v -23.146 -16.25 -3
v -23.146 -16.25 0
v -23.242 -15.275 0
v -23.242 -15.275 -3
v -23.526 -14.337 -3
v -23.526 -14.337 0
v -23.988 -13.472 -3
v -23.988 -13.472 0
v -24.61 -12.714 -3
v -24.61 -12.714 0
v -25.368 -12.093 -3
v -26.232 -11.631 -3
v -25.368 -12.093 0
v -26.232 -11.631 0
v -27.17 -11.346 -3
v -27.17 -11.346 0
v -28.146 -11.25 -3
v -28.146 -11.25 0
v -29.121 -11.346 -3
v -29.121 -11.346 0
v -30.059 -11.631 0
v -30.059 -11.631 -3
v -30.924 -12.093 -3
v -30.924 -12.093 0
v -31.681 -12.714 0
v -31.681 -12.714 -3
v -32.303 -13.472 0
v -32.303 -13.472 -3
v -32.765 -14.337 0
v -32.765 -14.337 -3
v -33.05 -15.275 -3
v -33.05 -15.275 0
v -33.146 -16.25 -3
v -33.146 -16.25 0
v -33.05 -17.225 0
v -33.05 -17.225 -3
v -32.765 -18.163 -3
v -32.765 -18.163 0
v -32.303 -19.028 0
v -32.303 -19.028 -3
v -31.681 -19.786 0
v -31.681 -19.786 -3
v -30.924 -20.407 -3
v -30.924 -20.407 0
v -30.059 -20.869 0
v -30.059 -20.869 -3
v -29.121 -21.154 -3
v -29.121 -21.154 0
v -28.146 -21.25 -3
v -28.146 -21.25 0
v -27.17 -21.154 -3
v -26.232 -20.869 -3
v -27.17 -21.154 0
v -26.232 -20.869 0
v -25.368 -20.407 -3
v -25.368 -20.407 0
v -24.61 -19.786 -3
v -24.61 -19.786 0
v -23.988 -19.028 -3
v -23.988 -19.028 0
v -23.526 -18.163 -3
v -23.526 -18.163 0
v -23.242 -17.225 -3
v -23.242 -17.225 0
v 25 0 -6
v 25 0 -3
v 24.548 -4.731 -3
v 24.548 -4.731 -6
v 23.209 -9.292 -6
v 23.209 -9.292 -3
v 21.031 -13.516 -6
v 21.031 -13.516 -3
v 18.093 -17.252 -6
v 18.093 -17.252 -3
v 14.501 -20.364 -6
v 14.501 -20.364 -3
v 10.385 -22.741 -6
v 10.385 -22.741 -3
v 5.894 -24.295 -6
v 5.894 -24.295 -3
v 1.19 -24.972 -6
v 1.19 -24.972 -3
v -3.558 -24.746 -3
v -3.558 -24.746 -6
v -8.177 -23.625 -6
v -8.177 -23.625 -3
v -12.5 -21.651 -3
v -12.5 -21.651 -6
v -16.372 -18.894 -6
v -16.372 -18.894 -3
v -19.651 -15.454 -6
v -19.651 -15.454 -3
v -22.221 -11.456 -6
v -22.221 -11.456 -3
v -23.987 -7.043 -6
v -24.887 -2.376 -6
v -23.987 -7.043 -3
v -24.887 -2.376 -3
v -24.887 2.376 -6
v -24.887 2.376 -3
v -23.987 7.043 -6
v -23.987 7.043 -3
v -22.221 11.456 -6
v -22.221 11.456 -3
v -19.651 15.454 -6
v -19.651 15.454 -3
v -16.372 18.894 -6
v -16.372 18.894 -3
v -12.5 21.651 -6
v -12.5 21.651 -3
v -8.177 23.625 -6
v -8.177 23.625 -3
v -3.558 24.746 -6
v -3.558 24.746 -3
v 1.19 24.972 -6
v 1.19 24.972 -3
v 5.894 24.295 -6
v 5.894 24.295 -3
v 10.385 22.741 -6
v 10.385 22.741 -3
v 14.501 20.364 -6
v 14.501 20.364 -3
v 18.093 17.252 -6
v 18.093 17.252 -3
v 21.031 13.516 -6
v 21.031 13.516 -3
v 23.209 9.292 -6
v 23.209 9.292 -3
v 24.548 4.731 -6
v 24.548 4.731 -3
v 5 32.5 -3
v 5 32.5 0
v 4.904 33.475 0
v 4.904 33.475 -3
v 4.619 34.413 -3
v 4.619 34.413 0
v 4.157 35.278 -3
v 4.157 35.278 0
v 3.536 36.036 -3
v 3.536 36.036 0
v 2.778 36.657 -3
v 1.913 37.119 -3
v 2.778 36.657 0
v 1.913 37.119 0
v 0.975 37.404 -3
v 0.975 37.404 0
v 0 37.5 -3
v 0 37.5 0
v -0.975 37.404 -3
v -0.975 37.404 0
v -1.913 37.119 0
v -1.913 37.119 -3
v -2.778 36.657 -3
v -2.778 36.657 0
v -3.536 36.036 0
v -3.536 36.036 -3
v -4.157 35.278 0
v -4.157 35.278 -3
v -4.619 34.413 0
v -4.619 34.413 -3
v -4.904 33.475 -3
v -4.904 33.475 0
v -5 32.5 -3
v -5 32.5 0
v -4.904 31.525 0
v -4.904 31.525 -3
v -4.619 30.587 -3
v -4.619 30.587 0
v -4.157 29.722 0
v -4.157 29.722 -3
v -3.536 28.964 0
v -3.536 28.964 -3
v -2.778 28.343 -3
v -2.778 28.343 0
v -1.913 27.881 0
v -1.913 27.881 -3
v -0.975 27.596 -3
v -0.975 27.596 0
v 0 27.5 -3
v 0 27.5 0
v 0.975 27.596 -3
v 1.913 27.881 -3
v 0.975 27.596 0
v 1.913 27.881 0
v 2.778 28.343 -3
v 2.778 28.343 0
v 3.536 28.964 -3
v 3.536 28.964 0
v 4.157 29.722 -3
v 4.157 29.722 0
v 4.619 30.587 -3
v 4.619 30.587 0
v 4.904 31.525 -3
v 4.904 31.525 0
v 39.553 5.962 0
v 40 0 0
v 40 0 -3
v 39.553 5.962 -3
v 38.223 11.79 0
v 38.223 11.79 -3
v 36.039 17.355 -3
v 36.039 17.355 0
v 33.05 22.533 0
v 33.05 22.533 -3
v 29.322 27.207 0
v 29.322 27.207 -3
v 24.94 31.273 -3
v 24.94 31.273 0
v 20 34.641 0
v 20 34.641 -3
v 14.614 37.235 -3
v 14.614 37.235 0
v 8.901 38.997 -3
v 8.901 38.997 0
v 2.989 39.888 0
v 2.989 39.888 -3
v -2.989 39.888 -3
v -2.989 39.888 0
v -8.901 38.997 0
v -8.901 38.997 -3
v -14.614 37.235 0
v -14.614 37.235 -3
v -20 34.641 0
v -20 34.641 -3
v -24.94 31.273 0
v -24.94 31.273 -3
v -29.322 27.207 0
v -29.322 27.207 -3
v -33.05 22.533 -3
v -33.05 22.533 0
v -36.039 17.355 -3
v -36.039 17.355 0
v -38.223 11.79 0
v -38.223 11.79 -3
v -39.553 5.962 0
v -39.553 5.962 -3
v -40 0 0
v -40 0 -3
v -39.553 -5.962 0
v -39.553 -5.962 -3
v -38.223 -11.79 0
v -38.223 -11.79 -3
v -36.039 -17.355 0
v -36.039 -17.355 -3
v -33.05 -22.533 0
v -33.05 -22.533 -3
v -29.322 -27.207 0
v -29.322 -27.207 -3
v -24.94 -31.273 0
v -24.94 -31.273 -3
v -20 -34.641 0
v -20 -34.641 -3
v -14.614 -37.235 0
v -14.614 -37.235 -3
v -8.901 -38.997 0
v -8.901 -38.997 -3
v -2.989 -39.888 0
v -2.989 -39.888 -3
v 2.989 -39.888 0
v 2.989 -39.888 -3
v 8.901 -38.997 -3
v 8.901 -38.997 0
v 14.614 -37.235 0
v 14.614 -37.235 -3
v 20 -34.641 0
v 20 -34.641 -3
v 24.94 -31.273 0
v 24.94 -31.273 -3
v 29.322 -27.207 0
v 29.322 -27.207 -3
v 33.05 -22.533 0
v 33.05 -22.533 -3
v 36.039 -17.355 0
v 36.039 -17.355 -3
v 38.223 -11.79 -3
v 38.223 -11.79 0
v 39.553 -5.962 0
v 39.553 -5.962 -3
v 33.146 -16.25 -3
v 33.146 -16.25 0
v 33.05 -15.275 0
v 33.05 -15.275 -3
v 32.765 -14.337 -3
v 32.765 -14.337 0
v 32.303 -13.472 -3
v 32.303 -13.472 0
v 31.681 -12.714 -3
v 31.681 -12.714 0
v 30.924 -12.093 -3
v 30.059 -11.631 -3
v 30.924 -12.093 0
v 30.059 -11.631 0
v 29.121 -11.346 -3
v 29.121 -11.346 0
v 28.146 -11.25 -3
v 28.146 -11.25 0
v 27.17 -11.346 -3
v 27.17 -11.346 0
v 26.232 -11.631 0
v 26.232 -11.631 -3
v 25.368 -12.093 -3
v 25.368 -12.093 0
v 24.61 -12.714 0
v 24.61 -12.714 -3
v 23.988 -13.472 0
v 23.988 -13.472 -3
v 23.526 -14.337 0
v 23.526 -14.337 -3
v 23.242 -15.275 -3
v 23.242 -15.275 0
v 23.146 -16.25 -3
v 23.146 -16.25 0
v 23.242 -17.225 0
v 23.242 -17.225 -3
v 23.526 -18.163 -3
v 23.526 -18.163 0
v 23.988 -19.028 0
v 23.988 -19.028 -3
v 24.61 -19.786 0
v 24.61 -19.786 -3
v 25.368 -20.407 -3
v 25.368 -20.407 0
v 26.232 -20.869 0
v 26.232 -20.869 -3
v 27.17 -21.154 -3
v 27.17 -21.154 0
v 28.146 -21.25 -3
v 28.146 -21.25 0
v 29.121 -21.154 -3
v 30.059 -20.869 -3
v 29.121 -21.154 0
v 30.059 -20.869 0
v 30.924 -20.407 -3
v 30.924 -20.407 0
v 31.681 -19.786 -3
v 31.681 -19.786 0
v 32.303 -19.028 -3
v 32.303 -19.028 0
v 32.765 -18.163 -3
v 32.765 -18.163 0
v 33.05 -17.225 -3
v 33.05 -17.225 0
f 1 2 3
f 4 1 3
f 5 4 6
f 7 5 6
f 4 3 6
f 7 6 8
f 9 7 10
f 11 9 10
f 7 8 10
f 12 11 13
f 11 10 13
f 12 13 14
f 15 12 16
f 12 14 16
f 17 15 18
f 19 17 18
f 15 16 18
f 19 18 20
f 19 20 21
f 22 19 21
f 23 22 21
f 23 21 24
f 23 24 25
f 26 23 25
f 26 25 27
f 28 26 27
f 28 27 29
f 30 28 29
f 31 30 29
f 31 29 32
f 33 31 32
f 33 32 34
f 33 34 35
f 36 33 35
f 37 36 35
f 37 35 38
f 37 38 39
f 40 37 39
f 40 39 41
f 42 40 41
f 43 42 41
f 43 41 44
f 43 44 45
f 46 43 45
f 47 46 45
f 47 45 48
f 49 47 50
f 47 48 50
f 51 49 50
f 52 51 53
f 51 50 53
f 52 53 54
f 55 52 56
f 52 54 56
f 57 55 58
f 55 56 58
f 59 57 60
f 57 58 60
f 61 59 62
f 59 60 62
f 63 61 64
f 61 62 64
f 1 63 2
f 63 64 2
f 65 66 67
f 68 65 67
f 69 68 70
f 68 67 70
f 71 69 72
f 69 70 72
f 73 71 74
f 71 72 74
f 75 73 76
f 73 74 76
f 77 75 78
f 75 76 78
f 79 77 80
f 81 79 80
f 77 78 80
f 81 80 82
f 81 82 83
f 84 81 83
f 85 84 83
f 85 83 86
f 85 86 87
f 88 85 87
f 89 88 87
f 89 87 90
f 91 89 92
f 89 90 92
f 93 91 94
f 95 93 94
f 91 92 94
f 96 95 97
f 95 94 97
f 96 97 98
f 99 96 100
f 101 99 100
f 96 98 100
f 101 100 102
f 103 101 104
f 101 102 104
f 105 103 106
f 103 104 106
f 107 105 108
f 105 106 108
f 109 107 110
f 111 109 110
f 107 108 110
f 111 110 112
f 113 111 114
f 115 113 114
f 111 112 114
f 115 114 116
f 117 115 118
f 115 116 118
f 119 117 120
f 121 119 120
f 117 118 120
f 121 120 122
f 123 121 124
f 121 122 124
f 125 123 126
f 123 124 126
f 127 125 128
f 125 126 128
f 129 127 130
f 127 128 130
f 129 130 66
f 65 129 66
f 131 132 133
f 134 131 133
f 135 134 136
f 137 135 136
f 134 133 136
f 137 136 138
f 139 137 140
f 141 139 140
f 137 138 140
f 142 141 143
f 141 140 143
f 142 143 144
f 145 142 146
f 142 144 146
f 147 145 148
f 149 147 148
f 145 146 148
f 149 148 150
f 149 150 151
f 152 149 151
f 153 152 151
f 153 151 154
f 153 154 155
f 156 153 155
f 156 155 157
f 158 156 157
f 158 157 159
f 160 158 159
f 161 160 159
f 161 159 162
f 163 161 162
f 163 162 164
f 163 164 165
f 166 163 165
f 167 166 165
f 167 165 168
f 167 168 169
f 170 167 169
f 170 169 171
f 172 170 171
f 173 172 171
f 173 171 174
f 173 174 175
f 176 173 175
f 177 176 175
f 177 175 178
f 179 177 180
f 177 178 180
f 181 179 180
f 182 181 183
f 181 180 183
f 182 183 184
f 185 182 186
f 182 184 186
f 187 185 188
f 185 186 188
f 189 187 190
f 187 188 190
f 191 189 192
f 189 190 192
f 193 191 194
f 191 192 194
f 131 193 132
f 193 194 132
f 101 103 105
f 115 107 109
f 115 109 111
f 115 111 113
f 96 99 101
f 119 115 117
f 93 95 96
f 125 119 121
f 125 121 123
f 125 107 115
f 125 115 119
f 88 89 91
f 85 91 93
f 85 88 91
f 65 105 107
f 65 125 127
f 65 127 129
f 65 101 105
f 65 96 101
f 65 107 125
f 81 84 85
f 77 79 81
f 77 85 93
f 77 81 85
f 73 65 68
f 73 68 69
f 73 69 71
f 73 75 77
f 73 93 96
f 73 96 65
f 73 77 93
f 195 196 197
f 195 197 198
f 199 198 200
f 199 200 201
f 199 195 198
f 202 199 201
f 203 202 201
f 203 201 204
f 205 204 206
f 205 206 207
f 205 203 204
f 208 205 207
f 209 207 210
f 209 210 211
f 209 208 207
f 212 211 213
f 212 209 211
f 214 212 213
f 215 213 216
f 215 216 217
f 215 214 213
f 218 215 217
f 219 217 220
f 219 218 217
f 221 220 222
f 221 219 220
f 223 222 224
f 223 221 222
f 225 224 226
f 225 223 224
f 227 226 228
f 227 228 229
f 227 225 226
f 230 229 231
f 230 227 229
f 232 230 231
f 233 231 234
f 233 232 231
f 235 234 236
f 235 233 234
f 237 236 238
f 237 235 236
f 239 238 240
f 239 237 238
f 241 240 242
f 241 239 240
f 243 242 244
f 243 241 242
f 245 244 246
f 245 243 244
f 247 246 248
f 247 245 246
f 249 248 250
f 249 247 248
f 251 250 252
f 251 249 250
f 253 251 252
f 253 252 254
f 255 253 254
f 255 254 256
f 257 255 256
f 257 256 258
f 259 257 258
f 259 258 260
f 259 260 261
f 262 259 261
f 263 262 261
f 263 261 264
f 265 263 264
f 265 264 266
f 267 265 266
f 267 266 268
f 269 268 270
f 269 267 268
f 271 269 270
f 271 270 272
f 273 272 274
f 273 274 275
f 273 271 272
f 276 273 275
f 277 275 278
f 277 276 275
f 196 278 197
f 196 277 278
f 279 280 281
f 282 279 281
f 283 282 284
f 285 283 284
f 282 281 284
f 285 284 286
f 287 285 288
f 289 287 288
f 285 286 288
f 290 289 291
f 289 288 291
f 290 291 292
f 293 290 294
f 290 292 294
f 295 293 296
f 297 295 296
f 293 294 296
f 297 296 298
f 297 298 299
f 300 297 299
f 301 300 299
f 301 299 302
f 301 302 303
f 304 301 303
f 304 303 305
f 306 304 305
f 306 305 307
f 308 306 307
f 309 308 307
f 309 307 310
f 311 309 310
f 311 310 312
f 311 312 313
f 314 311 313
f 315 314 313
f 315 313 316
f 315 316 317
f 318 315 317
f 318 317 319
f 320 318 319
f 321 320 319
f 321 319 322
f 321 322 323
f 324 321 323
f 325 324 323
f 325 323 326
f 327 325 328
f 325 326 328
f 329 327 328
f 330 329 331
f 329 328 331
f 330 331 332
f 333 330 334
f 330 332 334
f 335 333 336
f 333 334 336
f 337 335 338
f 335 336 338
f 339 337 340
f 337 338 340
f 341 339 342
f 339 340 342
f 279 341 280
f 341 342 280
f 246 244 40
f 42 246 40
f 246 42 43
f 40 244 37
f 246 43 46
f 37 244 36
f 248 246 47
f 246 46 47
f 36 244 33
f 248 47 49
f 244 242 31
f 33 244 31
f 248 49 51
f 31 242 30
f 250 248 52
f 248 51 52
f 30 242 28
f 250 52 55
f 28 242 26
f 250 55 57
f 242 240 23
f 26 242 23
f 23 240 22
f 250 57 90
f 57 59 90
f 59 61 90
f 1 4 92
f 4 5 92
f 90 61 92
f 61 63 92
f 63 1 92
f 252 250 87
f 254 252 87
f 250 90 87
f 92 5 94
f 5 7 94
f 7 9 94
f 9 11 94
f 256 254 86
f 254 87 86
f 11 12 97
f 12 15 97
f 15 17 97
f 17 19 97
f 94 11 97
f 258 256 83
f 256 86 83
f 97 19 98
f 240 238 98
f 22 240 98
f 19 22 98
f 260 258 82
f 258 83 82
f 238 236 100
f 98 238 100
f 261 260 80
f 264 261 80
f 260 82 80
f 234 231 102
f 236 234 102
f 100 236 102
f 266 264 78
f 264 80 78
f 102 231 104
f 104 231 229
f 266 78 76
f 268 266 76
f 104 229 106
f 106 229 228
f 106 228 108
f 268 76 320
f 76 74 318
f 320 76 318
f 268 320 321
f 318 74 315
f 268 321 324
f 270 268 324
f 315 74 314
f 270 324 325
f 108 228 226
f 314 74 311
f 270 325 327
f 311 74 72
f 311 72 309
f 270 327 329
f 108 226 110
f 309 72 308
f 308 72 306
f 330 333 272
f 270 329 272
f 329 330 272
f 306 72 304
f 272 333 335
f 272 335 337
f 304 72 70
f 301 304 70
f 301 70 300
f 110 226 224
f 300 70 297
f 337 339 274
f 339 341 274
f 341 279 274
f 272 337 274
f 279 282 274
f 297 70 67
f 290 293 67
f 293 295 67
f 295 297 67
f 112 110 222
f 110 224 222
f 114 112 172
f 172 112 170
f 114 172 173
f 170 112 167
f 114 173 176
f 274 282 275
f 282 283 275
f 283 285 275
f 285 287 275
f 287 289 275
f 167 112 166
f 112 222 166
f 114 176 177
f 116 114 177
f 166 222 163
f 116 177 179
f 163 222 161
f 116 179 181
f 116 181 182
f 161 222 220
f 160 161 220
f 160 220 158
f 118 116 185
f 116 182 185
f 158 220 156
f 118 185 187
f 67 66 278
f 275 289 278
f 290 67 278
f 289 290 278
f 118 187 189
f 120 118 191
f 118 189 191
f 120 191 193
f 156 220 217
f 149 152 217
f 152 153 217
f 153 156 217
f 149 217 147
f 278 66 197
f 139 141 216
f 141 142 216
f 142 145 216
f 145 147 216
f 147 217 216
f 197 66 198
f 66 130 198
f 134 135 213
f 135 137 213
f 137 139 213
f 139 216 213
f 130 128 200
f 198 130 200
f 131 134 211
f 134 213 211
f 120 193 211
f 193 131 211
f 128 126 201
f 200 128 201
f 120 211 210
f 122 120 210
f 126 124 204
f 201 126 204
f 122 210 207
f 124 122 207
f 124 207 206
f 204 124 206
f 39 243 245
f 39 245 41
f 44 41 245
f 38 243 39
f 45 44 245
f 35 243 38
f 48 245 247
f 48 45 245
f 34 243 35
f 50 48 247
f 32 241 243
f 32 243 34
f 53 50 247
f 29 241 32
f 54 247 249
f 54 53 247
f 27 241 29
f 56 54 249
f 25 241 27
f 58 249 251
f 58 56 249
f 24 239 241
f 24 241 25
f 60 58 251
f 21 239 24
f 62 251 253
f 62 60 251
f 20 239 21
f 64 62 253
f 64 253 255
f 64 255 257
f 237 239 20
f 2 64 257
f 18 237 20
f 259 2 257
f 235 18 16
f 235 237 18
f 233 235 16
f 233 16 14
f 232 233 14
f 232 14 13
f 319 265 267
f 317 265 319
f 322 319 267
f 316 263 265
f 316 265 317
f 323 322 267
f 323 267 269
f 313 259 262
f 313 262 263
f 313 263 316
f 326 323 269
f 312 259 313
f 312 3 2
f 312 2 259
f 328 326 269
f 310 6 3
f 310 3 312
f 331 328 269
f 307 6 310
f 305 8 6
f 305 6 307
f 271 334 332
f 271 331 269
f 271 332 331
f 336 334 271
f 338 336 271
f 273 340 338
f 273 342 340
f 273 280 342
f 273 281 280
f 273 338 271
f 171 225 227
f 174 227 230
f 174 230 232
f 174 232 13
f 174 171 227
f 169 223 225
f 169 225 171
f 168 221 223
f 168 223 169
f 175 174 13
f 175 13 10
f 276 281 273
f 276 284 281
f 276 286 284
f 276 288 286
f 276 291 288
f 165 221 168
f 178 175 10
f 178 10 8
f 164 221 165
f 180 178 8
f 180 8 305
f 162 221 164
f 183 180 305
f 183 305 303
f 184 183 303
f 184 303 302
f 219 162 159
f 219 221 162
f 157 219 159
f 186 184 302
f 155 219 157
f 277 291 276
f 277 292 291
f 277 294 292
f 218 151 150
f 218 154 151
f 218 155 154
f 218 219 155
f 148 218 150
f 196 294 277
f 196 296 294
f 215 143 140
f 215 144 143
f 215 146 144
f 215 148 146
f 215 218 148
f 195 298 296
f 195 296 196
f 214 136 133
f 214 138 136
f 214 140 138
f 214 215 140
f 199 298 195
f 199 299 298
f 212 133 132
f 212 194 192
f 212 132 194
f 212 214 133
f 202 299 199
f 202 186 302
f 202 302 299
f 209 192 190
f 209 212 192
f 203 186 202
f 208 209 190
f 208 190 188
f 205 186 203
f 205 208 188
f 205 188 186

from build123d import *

# Parameters (mm, degrees)
F0_R     = 40
F1_DEPTH = 3
F2_R     = 5
F3_DEPTH = 25
F4_R     = 25
F5_DEPTH = 3


with BuildPart() as f1:
    # F0 (on Top) → F1 (new body)
    with BuildSketch(Plane.XY):
        Circle(F0_R)
    extrude(amount=-F1_DEPTH)

    # F2 (on Top) → F3 (cut)
    with BuildSketch(Plane.XY):
        with Locations((0, 32.5)):
            Circle(F2_R)
        with Locations((-28.145826, -16.25)):
            Circle(F2_R)
        with Locations((28.145826, -16.25)):
            Circle(F2_R)
    extrude(amount=-F3_DEPTH, mode=Mode.SUBTRACT)

    # F4 (on face) → F5 (join)
    with BuildSketch(Plane(origin=(0, 0, -3), x_dir=(1, 0, 0), z_dir=(0, 0, -1))):
        Circle(F4_R)
    extrude(amount=F5_DEPTH)


solid = f1.part
